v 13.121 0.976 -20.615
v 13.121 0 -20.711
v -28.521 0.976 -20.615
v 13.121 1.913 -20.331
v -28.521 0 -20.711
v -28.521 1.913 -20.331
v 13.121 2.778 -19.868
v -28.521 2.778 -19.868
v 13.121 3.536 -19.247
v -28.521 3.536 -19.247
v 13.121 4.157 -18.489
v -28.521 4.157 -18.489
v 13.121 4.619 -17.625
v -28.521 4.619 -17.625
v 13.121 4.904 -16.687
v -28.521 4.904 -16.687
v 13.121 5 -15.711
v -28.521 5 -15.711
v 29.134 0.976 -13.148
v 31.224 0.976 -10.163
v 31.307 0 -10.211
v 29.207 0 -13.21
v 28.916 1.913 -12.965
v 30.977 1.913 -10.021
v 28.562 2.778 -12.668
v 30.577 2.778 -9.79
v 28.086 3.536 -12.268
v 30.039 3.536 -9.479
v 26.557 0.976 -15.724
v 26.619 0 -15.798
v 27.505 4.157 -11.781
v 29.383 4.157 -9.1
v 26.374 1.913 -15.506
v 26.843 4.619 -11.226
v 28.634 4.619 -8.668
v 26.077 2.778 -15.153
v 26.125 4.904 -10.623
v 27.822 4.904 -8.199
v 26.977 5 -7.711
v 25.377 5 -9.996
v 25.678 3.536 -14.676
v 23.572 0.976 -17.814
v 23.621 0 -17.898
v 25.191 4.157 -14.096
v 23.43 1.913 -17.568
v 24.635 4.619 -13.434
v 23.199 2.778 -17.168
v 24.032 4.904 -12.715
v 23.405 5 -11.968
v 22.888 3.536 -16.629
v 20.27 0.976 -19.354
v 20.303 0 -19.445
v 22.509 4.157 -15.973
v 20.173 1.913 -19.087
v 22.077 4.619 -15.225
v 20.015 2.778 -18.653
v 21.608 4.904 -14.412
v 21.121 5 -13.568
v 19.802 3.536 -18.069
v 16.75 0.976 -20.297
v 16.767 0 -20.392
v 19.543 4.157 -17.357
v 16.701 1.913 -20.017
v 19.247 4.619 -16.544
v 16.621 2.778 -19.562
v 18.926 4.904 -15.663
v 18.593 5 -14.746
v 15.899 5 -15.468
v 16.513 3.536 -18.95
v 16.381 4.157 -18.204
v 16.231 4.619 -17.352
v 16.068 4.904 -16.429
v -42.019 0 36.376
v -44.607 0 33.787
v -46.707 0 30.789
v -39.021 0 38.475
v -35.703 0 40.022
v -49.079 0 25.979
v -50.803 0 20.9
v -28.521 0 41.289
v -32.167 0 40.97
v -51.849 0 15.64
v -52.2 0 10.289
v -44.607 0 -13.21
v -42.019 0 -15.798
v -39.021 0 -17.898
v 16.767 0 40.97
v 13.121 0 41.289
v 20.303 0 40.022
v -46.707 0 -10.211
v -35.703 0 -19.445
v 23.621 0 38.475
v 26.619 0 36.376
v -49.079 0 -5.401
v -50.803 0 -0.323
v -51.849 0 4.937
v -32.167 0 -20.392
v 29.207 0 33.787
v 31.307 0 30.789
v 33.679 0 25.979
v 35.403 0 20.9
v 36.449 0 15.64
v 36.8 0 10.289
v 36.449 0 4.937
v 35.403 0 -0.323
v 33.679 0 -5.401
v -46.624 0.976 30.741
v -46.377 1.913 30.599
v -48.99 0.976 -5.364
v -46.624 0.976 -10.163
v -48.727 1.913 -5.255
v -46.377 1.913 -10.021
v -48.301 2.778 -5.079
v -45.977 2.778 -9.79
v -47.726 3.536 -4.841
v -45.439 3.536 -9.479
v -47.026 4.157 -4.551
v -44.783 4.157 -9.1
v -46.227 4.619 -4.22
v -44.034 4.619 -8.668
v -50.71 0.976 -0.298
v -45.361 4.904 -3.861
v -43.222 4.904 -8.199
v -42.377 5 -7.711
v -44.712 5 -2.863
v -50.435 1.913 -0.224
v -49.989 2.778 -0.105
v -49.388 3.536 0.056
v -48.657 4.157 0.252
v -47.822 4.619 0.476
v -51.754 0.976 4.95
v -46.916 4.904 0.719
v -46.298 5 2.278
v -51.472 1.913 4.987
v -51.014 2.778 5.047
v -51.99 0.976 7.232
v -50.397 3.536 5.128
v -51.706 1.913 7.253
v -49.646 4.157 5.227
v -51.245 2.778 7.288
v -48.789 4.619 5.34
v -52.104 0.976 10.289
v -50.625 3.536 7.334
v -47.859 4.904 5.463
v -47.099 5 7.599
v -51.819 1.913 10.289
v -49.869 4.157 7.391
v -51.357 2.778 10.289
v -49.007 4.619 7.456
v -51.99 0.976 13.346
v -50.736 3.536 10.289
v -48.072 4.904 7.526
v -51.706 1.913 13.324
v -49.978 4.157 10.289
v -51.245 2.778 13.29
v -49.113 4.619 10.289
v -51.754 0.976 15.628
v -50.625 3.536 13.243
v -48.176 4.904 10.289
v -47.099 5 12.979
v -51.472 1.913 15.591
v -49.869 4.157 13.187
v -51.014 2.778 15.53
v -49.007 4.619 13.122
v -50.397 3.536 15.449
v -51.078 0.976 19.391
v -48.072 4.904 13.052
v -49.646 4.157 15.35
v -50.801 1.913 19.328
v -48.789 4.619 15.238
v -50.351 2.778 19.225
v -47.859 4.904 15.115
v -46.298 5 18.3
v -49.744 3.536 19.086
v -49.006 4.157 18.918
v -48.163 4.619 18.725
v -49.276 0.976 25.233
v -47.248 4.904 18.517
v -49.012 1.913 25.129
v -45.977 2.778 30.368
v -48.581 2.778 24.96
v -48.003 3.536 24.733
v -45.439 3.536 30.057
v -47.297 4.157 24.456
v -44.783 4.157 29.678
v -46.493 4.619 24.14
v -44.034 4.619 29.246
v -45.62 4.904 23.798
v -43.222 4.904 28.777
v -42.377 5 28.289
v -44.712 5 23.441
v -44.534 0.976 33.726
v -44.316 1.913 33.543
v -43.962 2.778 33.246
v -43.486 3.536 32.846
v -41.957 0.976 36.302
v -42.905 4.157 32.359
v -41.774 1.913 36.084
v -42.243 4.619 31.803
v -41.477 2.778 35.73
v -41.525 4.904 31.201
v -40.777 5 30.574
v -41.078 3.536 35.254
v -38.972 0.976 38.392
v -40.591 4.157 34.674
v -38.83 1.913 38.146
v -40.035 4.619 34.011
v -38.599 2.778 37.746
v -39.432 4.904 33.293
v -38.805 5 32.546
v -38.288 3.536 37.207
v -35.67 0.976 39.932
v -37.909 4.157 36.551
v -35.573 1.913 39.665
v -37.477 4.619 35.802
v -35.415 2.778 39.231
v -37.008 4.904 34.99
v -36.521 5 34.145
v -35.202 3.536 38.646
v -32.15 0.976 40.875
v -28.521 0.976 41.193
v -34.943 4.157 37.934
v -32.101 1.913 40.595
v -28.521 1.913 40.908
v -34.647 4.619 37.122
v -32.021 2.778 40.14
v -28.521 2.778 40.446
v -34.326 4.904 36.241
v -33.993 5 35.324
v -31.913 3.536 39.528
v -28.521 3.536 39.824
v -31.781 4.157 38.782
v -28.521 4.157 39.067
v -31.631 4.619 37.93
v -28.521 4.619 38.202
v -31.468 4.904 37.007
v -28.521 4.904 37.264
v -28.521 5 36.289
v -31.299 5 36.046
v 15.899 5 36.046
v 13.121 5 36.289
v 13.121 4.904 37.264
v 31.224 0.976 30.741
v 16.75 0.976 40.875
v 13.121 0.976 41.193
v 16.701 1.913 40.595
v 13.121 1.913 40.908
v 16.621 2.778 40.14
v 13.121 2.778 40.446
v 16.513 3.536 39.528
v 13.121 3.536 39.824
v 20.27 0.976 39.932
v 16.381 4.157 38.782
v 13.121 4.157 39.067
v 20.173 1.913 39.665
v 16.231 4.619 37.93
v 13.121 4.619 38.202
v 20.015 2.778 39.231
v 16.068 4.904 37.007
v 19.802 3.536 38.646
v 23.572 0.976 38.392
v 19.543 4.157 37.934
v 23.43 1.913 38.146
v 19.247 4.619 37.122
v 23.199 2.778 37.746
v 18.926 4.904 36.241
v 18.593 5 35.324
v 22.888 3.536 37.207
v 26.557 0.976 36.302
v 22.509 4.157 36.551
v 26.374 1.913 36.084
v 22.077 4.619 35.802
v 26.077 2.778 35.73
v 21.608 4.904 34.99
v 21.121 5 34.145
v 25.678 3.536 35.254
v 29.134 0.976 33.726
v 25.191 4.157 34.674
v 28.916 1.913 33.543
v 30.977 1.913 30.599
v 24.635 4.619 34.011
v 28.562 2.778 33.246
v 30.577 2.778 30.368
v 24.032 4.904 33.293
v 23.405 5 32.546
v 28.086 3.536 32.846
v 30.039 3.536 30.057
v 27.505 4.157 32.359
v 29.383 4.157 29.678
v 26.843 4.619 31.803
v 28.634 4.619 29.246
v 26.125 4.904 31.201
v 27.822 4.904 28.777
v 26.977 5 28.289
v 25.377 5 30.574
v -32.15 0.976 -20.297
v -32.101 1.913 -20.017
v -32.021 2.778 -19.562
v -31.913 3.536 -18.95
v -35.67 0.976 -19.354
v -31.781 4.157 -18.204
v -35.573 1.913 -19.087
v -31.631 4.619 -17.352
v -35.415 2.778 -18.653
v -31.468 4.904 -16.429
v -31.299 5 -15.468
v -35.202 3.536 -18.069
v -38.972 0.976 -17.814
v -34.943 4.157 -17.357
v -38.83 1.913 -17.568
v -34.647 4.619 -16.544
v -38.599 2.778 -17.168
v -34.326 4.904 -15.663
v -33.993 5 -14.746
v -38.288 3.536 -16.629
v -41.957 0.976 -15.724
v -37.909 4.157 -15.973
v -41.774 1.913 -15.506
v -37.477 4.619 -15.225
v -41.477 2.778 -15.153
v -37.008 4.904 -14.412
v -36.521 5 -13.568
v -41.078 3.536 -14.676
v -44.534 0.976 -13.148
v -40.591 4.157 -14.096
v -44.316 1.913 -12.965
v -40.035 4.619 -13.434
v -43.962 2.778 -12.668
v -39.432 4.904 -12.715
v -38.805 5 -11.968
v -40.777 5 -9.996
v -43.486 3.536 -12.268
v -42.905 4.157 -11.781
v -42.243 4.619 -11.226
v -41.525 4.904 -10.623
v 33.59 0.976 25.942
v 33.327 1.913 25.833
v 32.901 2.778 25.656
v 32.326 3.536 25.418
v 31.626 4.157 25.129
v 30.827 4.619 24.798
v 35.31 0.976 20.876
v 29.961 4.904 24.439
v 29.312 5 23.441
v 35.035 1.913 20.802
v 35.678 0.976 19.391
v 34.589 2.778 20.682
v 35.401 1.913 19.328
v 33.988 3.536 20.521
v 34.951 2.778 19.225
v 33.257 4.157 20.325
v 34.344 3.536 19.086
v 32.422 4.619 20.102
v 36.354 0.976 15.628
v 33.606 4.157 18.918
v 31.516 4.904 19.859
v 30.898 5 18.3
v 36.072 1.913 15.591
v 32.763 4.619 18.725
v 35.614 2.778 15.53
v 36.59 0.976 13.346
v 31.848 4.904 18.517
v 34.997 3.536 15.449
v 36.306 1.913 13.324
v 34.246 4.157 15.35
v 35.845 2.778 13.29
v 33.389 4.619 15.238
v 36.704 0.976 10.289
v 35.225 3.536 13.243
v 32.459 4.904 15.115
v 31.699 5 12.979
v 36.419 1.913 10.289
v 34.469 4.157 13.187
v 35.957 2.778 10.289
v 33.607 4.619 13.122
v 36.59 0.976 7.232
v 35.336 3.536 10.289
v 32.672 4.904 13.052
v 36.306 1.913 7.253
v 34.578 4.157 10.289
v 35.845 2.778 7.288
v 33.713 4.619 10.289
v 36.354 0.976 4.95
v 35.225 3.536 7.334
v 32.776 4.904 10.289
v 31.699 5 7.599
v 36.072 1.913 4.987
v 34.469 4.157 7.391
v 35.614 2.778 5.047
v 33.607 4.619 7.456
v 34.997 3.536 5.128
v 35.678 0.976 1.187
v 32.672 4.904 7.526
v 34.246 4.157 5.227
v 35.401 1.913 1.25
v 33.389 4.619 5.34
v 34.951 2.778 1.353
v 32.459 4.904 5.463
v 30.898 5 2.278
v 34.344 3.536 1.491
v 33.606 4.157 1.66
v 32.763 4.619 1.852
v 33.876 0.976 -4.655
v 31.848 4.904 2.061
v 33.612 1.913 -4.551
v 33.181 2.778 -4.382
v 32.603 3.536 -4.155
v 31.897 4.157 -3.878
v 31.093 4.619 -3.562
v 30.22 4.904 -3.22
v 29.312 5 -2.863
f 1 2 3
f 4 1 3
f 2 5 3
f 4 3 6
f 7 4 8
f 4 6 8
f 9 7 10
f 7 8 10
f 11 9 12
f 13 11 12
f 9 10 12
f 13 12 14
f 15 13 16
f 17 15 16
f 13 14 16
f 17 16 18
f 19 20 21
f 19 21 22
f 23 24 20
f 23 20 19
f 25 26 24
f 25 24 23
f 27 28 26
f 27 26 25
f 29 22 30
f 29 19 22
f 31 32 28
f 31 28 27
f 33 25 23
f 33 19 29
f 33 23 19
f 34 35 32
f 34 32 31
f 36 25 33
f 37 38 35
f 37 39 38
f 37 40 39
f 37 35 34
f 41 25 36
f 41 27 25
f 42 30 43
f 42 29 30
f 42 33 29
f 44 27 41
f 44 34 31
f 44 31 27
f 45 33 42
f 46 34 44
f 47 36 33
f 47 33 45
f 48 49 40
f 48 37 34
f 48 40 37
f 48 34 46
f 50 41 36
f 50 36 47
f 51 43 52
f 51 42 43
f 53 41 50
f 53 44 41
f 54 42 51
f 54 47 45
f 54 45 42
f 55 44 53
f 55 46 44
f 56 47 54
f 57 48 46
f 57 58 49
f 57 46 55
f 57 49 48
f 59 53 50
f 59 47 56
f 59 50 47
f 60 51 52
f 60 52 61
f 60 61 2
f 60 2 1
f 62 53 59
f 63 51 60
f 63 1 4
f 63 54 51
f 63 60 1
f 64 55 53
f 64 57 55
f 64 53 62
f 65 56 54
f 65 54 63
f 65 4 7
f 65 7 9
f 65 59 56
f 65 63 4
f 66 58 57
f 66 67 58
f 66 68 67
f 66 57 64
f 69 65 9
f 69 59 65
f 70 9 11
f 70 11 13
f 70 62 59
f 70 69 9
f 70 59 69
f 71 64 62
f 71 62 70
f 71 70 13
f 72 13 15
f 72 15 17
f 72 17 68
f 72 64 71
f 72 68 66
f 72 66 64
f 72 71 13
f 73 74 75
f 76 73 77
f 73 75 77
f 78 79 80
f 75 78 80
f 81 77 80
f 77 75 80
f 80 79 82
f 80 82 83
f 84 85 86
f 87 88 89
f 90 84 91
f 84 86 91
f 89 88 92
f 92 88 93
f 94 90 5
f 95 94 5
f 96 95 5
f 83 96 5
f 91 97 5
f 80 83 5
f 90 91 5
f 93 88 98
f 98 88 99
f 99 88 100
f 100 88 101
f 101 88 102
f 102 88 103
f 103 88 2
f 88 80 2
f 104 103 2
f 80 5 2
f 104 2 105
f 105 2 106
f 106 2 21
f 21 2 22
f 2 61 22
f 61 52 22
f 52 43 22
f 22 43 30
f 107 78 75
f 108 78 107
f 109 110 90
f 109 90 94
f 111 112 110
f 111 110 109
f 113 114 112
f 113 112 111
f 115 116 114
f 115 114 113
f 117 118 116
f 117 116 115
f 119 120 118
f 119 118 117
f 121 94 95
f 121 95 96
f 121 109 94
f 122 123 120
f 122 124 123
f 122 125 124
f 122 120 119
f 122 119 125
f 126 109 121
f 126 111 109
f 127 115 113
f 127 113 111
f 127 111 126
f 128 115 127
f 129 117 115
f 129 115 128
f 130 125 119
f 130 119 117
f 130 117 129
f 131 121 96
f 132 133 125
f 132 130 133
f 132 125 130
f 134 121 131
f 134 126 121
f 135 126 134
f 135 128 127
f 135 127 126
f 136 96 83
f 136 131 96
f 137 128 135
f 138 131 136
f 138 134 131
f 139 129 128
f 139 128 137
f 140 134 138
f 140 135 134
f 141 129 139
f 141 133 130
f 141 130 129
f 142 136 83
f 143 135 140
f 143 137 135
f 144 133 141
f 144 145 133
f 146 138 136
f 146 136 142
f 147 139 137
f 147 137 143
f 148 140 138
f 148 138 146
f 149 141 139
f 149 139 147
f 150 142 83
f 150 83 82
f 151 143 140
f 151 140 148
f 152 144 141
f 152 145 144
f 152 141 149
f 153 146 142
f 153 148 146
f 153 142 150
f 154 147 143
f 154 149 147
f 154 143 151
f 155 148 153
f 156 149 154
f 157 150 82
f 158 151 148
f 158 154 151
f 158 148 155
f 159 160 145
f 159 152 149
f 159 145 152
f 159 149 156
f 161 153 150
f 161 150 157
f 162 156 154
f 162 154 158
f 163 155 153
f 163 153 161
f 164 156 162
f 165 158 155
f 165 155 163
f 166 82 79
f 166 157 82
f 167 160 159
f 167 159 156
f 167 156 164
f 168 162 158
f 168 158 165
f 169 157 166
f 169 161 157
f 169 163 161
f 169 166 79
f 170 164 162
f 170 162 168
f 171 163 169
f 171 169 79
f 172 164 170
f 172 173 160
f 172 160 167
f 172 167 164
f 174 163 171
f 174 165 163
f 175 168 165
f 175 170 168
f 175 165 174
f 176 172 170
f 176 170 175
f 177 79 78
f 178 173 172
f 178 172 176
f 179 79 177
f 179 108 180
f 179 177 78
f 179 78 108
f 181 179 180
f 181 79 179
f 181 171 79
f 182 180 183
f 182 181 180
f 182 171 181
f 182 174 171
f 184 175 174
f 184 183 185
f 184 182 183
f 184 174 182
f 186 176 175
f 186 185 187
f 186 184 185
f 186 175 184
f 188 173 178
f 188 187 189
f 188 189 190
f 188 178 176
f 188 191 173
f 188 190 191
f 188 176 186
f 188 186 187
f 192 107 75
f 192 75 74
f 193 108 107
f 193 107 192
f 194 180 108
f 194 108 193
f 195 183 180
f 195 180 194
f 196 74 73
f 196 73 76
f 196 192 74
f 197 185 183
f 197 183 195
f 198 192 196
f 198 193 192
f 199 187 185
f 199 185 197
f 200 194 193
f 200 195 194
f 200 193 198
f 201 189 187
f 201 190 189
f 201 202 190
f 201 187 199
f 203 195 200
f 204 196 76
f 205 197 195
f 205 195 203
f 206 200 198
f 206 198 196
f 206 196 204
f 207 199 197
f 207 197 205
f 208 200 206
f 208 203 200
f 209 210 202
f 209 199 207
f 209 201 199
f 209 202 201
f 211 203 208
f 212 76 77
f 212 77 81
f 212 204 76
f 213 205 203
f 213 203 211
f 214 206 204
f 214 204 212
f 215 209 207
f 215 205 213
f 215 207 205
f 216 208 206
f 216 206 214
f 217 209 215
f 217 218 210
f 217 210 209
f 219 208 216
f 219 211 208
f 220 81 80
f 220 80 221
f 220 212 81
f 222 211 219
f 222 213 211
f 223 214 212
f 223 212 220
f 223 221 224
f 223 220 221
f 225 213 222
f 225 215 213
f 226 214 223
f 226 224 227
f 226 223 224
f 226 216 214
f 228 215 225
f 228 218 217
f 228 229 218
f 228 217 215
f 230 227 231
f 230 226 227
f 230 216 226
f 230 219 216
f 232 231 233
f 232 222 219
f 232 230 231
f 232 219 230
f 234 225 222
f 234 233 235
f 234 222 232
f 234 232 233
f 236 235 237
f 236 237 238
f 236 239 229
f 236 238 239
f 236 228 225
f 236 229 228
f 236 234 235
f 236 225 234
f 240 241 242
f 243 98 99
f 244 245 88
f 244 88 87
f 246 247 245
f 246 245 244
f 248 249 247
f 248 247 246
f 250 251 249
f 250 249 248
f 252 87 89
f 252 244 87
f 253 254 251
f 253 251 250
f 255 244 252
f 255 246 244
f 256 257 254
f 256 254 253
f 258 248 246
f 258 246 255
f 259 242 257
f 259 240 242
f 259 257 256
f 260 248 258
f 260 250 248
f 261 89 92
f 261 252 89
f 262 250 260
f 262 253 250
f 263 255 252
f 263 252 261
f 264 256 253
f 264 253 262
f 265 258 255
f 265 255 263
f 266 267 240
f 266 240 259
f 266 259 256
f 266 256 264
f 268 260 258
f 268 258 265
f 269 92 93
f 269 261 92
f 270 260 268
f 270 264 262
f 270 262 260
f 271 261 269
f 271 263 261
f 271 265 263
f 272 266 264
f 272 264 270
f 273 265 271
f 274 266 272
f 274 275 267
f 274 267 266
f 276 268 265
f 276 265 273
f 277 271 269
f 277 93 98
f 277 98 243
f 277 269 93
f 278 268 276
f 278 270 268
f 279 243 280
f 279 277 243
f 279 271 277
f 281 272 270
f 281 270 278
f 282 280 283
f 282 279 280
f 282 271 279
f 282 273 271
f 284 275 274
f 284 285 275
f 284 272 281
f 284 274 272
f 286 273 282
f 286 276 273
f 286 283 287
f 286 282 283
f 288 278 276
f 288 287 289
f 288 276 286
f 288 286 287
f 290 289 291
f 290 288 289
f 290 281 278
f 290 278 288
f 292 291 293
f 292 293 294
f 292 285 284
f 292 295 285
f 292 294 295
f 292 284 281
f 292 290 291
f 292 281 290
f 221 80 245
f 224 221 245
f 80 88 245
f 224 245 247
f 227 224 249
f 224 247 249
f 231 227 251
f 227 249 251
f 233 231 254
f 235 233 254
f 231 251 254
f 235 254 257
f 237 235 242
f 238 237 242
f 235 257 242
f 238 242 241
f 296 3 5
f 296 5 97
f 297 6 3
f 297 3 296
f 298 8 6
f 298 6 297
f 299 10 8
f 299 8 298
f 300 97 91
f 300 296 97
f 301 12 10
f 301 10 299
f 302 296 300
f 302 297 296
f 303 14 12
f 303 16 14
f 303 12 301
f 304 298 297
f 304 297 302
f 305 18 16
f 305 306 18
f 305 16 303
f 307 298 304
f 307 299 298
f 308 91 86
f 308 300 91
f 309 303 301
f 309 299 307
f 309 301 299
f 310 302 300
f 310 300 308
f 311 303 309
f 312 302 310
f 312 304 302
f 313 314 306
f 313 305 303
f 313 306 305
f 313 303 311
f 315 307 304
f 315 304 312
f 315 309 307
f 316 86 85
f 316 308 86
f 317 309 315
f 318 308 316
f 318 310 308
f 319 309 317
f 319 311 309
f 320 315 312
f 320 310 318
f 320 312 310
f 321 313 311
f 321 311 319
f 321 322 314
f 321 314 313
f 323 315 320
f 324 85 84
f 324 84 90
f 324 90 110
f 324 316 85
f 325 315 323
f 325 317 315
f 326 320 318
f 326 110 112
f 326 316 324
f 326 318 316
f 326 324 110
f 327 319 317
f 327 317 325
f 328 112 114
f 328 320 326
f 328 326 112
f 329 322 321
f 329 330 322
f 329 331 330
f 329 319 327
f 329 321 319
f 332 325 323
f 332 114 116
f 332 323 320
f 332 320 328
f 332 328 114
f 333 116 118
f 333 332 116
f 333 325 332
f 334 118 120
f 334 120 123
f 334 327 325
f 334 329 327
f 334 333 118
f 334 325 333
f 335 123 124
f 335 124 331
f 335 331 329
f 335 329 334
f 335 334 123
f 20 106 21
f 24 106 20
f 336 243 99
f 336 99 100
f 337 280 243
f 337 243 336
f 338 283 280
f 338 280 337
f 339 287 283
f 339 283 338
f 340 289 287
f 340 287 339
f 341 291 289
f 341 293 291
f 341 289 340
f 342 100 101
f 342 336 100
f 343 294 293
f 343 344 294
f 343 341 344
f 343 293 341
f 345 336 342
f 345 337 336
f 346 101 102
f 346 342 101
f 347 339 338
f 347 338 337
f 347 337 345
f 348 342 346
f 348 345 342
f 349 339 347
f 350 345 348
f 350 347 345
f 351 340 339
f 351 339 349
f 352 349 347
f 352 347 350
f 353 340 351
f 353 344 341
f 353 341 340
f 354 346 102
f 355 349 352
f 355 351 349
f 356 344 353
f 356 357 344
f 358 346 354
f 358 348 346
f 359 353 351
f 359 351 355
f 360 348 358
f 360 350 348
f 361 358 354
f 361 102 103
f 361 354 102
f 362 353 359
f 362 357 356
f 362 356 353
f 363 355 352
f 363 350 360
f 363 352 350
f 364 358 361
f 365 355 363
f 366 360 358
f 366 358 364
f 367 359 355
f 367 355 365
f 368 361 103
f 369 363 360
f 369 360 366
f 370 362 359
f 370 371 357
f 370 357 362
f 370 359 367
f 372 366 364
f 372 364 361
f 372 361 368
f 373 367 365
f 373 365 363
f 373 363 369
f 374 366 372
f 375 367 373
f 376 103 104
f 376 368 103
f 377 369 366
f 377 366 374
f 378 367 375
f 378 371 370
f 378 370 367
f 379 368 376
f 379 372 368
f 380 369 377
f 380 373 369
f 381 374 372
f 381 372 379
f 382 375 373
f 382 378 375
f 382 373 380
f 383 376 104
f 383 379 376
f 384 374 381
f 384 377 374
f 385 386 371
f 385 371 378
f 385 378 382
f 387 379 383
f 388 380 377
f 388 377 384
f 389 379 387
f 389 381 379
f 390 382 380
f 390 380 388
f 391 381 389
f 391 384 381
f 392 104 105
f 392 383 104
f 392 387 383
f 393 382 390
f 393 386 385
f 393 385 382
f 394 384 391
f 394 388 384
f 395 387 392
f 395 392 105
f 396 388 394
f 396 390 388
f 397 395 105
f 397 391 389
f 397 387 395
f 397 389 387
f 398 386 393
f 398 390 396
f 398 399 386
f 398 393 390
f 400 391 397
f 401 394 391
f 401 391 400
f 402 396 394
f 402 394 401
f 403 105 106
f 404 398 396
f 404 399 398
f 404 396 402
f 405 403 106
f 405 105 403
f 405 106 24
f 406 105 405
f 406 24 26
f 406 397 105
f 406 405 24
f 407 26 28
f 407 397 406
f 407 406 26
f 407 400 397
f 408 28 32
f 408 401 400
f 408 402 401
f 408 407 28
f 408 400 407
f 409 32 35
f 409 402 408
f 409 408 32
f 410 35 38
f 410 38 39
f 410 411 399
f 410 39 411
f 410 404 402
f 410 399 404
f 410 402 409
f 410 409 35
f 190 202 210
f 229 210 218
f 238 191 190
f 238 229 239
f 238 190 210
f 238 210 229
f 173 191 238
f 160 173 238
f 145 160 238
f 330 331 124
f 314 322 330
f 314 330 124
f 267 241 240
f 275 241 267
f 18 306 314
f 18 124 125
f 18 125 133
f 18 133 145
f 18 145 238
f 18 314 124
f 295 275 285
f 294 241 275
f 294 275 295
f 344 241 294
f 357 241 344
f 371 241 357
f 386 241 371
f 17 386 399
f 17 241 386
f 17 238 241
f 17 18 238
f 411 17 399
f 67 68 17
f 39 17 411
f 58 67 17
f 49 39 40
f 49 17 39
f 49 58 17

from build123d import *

# Parameters (mm, degrees)
SKETCH_1_W          = 89
SKETCH_1_H          = 62
EXTRUDE_1_DEPTH     = 5
CUT_EXTRUDE_START   = -5.000001
SKETCH_2_W          = 114.345269922
SKETCH_2_H          = 82.741202996
CUT_EXTRUDE_2_DEPTH = 5.000002
FILLET_1_R          = 5


with BuildPart() as part:
    # 草图1 → 凸台-拉伸1 (new body)
    with BuildSketch(Plane(origin=(0, 0, 0), x_dir=(1, 0, 0), z_dir=(0, 1, 0))):
        with Locations((-7.7, -10.288888889)):
            Rectangle(SKETCH_1_W, SKETCH_1_H)
    extrude(amount=EXTRUDE_1_DEPTH)

    # 草图2 → 切除-拉伸2 (cut)
    with BuildSketch(Plane(origin=(0, 5, 0), x_dir=(1, 0, 0), z_dir=(0, 1, 0)).offset(CUT_EXTRUDE_START)):
        with Locations((-11.341983823, -7.488413354)):
            Rectangle(SKETCH_2_W, SKETCH_2_H)
        with BuildLine():
            Line((-28.520508076, 20.711111111), (13.120508076, 20.711111111))
            ThreePointArc((13.120508076, 20.711111111), (23.620508076, 17.897644591), (31.307041555, 10.211111111))
            ThreePointArc((31.307041555, 10.211111111), (36.8, -10.288888889), (31.307041555, -30.788888889))
            ThreePointArc((31.307041555, -30.788888889), (23.620508076, -38.475422368), (13.120508076, -41.288888889))
            Line((13.120508076, -41.288888889), (-28.520508076, -41.288888889))
            ThreePointArc((-28.520508076, -41.288888889), (-39.020508076, -38.475422368), (-46.707041555, -30.788888889))
            ThreePointArc((-46.707041555, -30.788888889), (-52.2, -10.288888889), (-46.707041555, 10.211111111))
            ThreePointArc((-46.707041555, 10.211111111), (-39.020508076, 17.897644591), (-28.520508076, 20.711111111))
        make_face(mode=Mode.SUBTRACT)
    extrude(amount=CUT_EXTRUDE_2_DEPTH, mode=Mode.SUBTRACT)

    # 圆角1
    fillet_1_edges = [part.edges().sort_by_distance(p)[0] for p in [
        (36.8, 5, 10.288888889),
        (23.620508076, 5, 38.475422368),
        (-7.7, 5, 41.288888889),
        (-39.020508076, 5, 38.475422368),
        (-52.2, 5, 10.288888889),
        (-39.020508076, 5, -17.897644591),
        (-7.7, 5, -20.711111111),
        (23.620508076, 5, -17.897644591),
    ]]
    fillet(fillet_1_edges, radius=FILLET_1_R - 0.0001)  # a hair under: the kernel refuses the full size


solid = part.part
